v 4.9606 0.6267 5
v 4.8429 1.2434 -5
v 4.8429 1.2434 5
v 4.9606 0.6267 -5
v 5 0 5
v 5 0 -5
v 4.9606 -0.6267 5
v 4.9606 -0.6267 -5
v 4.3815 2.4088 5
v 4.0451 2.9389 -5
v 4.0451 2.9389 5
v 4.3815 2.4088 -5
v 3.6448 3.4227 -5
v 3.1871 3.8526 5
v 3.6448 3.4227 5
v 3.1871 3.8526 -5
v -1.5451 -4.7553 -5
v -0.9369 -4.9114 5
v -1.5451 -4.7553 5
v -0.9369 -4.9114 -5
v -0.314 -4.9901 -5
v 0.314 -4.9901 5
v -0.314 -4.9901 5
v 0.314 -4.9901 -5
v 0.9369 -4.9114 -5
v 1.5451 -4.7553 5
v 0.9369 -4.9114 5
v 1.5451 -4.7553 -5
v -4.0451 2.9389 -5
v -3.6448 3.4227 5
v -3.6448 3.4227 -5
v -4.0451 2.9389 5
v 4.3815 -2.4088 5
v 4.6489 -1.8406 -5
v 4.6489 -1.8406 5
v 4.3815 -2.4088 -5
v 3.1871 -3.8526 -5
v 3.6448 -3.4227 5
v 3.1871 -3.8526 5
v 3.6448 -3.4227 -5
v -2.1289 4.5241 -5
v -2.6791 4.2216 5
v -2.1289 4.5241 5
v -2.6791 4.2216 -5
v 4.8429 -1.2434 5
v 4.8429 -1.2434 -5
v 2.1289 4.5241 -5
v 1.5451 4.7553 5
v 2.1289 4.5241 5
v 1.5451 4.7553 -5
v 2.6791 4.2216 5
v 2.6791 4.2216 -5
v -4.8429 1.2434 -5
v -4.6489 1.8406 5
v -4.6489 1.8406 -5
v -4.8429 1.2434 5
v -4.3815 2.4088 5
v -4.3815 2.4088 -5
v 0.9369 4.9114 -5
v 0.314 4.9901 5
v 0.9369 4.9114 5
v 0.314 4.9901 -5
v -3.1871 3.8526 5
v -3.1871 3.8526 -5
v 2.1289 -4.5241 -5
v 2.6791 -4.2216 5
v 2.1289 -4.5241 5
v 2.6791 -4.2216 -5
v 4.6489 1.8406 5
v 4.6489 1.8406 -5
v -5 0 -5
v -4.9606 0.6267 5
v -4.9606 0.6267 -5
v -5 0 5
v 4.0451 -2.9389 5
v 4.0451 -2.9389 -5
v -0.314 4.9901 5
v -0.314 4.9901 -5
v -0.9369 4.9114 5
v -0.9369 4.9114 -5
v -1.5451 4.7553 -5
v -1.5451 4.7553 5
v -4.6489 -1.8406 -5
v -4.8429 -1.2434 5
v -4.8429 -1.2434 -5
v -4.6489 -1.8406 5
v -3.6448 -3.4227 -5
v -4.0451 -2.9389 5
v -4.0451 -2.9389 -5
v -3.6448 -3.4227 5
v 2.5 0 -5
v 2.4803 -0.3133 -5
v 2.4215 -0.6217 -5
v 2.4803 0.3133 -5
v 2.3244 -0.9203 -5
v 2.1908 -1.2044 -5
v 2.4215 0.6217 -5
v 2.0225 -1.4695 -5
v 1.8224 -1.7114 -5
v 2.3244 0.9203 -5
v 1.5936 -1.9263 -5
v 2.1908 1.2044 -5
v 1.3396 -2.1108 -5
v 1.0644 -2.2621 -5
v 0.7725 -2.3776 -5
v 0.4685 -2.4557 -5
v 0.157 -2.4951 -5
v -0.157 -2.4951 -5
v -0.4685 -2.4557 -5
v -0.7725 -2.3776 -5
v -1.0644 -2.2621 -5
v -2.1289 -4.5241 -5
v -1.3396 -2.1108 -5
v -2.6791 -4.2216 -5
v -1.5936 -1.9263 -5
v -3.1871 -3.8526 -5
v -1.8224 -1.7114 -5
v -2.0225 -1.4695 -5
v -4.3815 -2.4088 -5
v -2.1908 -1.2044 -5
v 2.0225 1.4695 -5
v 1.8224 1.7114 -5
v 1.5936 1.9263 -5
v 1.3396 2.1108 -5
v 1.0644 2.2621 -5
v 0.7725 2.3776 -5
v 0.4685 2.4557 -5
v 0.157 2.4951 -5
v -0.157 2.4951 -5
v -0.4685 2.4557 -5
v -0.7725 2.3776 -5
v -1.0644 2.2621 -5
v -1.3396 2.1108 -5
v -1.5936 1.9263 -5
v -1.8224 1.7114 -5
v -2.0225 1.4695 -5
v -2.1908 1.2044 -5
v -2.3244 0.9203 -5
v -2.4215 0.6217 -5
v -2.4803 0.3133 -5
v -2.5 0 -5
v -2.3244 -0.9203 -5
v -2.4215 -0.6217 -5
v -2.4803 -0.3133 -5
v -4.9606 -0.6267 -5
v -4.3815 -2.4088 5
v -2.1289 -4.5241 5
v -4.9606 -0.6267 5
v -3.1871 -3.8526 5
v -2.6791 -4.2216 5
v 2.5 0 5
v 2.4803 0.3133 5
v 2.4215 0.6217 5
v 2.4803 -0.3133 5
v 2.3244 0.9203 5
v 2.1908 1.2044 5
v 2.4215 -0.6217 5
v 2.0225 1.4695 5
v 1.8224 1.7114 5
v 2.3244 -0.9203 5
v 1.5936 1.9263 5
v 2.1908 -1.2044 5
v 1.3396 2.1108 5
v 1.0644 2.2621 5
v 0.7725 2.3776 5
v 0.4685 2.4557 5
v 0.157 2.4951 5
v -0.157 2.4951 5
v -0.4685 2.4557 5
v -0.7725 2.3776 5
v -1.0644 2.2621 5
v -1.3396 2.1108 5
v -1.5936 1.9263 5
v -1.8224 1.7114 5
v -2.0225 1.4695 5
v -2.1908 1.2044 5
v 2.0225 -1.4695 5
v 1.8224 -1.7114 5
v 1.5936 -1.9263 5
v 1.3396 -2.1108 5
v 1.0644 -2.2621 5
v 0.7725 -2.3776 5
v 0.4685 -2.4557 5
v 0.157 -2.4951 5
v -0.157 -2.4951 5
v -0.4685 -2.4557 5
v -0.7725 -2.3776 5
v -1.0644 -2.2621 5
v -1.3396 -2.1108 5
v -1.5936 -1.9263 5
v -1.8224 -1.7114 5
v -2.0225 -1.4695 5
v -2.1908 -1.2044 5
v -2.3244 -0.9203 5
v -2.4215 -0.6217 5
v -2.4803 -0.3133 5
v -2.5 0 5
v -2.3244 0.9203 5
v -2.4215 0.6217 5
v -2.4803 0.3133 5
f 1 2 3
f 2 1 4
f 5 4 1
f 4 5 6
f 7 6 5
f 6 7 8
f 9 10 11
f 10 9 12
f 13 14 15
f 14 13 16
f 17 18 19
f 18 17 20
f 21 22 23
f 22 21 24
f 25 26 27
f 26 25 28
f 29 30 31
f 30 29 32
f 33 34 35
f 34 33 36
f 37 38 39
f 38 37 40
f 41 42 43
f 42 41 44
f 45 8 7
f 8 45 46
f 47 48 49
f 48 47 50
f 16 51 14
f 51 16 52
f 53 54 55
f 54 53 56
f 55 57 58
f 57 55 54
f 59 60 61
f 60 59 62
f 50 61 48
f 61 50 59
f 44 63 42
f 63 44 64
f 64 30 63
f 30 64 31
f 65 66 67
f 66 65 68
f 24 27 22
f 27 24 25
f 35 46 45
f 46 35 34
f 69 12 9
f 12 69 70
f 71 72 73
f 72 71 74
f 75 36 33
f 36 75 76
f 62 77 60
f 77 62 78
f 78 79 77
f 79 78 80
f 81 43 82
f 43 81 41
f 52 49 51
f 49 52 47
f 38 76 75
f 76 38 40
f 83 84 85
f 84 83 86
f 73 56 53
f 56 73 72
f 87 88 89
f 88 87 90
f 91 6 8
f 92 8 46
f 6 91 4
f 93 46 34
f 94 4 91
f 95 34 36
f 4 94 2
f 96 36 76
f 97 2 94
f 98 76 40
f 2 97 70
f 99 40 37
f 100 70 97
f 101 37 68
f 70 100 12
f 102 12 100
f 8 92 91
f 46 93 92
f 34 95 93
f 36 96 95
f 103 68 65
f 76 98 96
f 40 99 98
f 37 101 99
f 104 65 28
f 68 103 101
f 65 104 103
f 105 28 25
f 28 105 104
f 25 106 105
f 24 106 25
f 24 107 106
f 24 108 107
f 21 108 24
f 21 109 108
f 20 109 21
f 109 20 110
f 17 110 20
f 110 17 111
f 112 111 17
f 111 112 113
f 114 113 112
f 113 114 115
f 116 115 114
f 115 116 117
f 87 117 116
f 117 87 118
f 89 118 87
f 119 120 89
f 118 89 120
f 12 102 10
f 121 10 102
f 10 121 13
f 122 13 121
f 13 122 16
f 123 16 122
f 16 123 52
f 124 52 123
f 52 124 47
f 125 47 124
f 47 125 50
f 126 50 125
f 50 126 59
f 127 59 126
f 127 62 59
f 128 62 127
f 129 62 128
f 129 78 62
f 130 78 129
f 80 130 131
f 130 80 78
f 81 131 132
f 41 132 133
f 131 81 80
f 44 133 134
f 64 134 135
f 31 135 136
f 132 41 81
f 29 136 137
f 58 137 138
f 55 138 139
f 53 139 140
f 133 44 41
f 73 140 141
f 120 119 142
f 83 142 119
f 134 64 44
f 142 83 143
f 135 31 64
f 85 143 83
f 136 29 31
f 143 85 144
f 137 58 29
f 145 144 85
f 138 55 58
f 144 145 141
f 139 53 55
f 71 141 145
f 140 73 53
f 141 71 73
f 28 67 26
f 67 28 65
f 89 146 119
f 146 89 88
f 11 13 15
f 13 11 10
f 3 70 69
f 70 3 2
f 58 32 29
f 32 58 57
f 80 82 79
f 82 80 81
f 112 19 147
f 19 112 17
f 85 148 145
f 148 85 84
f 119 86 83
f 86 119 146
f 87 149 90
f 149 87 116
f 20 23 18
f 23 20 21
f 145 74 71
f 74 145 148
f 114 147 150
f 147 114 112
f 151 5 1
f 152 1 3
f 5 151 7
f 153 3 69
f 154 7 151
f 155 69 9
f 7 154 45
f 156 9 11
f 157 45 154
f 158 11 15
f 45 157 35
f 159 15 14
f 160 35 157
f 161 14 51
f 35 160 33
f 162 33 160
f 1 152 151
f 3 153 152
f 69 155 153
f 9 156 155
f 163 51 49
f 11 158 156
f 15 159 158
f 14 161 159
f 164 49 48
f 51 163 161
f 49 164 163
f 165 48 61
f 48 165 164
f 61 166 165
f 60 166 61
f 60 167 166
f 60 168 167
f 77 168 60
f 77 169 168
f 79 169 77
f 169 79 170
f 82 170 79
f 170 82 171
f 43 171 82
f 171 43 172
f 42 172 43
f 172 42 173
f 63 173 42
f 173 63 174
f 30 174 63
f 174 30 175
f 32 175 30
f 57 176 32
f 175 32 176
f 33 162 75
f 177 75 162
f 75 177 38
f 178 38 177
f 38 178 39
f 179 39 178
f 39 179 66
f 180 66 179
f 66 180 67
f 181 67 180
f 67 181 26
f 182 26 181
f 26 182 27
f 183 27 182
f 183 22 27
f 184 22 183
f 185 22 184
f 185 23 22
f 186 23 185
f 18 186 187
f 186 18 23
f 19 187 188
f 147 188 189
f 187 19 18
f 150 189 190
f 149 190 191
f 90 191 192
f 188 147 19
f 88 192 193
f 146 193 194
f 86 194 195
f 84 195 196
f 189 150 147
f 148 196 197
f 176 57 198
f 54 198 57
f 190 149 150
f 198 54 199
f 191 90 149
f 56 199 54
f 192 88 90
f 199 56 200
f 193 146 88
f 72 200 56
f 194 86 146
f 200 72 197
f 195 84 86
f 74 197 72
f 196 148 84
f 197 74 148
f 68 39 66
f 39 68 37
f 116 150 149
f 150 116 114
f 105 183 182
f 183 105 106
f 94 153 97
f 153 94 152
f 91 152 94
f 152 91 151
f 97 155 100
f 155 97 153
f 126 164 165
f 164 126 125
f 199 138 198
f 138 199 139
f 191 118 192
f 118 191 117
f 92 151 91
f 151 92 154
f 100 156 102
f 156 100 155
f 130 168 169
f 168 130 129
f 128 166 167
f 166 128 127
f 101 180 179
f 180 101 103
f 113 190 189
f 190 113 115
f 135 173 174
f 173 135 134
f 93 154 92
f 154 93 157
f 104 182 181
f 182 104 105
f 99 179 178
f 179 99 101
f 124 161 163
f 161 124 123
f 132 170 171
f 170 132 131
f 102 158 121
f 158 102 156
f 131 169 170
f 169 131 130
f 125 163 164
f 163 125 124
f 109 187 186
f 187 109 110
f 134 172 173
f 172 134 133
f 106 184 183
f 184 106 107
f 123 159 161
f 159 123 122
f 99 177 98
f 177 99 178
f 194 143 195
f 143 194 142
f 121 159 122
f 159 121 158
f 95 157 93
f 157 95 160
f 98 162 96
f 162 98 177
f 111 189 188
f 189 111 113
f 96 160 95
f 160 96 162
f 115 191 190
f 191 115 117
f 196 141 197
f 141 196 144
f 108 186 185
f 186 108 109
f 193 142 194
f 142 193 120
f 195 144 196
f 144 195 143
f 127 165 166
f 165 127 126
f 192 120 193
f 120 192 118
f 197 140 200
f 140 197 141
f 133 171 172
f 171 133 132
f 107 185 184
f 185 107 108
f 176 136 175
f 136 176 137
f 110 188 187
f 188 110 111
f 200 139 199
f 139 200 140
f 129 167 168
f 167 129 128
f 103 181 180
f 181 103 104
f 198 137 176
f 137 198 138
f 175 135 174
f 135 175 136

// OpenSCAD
$fn = 50;


difference() {
	union() {
		translate(v = [0, 0, -5.0000000000]) {
			cylinder(h = 10, r = 5.0000000000);
		}
	}
	union() {
		translate(v = [0, 0, -100.0000000000]) {
			cylinder(h = 200, r = 2.5000000000);
		}
	}
}
